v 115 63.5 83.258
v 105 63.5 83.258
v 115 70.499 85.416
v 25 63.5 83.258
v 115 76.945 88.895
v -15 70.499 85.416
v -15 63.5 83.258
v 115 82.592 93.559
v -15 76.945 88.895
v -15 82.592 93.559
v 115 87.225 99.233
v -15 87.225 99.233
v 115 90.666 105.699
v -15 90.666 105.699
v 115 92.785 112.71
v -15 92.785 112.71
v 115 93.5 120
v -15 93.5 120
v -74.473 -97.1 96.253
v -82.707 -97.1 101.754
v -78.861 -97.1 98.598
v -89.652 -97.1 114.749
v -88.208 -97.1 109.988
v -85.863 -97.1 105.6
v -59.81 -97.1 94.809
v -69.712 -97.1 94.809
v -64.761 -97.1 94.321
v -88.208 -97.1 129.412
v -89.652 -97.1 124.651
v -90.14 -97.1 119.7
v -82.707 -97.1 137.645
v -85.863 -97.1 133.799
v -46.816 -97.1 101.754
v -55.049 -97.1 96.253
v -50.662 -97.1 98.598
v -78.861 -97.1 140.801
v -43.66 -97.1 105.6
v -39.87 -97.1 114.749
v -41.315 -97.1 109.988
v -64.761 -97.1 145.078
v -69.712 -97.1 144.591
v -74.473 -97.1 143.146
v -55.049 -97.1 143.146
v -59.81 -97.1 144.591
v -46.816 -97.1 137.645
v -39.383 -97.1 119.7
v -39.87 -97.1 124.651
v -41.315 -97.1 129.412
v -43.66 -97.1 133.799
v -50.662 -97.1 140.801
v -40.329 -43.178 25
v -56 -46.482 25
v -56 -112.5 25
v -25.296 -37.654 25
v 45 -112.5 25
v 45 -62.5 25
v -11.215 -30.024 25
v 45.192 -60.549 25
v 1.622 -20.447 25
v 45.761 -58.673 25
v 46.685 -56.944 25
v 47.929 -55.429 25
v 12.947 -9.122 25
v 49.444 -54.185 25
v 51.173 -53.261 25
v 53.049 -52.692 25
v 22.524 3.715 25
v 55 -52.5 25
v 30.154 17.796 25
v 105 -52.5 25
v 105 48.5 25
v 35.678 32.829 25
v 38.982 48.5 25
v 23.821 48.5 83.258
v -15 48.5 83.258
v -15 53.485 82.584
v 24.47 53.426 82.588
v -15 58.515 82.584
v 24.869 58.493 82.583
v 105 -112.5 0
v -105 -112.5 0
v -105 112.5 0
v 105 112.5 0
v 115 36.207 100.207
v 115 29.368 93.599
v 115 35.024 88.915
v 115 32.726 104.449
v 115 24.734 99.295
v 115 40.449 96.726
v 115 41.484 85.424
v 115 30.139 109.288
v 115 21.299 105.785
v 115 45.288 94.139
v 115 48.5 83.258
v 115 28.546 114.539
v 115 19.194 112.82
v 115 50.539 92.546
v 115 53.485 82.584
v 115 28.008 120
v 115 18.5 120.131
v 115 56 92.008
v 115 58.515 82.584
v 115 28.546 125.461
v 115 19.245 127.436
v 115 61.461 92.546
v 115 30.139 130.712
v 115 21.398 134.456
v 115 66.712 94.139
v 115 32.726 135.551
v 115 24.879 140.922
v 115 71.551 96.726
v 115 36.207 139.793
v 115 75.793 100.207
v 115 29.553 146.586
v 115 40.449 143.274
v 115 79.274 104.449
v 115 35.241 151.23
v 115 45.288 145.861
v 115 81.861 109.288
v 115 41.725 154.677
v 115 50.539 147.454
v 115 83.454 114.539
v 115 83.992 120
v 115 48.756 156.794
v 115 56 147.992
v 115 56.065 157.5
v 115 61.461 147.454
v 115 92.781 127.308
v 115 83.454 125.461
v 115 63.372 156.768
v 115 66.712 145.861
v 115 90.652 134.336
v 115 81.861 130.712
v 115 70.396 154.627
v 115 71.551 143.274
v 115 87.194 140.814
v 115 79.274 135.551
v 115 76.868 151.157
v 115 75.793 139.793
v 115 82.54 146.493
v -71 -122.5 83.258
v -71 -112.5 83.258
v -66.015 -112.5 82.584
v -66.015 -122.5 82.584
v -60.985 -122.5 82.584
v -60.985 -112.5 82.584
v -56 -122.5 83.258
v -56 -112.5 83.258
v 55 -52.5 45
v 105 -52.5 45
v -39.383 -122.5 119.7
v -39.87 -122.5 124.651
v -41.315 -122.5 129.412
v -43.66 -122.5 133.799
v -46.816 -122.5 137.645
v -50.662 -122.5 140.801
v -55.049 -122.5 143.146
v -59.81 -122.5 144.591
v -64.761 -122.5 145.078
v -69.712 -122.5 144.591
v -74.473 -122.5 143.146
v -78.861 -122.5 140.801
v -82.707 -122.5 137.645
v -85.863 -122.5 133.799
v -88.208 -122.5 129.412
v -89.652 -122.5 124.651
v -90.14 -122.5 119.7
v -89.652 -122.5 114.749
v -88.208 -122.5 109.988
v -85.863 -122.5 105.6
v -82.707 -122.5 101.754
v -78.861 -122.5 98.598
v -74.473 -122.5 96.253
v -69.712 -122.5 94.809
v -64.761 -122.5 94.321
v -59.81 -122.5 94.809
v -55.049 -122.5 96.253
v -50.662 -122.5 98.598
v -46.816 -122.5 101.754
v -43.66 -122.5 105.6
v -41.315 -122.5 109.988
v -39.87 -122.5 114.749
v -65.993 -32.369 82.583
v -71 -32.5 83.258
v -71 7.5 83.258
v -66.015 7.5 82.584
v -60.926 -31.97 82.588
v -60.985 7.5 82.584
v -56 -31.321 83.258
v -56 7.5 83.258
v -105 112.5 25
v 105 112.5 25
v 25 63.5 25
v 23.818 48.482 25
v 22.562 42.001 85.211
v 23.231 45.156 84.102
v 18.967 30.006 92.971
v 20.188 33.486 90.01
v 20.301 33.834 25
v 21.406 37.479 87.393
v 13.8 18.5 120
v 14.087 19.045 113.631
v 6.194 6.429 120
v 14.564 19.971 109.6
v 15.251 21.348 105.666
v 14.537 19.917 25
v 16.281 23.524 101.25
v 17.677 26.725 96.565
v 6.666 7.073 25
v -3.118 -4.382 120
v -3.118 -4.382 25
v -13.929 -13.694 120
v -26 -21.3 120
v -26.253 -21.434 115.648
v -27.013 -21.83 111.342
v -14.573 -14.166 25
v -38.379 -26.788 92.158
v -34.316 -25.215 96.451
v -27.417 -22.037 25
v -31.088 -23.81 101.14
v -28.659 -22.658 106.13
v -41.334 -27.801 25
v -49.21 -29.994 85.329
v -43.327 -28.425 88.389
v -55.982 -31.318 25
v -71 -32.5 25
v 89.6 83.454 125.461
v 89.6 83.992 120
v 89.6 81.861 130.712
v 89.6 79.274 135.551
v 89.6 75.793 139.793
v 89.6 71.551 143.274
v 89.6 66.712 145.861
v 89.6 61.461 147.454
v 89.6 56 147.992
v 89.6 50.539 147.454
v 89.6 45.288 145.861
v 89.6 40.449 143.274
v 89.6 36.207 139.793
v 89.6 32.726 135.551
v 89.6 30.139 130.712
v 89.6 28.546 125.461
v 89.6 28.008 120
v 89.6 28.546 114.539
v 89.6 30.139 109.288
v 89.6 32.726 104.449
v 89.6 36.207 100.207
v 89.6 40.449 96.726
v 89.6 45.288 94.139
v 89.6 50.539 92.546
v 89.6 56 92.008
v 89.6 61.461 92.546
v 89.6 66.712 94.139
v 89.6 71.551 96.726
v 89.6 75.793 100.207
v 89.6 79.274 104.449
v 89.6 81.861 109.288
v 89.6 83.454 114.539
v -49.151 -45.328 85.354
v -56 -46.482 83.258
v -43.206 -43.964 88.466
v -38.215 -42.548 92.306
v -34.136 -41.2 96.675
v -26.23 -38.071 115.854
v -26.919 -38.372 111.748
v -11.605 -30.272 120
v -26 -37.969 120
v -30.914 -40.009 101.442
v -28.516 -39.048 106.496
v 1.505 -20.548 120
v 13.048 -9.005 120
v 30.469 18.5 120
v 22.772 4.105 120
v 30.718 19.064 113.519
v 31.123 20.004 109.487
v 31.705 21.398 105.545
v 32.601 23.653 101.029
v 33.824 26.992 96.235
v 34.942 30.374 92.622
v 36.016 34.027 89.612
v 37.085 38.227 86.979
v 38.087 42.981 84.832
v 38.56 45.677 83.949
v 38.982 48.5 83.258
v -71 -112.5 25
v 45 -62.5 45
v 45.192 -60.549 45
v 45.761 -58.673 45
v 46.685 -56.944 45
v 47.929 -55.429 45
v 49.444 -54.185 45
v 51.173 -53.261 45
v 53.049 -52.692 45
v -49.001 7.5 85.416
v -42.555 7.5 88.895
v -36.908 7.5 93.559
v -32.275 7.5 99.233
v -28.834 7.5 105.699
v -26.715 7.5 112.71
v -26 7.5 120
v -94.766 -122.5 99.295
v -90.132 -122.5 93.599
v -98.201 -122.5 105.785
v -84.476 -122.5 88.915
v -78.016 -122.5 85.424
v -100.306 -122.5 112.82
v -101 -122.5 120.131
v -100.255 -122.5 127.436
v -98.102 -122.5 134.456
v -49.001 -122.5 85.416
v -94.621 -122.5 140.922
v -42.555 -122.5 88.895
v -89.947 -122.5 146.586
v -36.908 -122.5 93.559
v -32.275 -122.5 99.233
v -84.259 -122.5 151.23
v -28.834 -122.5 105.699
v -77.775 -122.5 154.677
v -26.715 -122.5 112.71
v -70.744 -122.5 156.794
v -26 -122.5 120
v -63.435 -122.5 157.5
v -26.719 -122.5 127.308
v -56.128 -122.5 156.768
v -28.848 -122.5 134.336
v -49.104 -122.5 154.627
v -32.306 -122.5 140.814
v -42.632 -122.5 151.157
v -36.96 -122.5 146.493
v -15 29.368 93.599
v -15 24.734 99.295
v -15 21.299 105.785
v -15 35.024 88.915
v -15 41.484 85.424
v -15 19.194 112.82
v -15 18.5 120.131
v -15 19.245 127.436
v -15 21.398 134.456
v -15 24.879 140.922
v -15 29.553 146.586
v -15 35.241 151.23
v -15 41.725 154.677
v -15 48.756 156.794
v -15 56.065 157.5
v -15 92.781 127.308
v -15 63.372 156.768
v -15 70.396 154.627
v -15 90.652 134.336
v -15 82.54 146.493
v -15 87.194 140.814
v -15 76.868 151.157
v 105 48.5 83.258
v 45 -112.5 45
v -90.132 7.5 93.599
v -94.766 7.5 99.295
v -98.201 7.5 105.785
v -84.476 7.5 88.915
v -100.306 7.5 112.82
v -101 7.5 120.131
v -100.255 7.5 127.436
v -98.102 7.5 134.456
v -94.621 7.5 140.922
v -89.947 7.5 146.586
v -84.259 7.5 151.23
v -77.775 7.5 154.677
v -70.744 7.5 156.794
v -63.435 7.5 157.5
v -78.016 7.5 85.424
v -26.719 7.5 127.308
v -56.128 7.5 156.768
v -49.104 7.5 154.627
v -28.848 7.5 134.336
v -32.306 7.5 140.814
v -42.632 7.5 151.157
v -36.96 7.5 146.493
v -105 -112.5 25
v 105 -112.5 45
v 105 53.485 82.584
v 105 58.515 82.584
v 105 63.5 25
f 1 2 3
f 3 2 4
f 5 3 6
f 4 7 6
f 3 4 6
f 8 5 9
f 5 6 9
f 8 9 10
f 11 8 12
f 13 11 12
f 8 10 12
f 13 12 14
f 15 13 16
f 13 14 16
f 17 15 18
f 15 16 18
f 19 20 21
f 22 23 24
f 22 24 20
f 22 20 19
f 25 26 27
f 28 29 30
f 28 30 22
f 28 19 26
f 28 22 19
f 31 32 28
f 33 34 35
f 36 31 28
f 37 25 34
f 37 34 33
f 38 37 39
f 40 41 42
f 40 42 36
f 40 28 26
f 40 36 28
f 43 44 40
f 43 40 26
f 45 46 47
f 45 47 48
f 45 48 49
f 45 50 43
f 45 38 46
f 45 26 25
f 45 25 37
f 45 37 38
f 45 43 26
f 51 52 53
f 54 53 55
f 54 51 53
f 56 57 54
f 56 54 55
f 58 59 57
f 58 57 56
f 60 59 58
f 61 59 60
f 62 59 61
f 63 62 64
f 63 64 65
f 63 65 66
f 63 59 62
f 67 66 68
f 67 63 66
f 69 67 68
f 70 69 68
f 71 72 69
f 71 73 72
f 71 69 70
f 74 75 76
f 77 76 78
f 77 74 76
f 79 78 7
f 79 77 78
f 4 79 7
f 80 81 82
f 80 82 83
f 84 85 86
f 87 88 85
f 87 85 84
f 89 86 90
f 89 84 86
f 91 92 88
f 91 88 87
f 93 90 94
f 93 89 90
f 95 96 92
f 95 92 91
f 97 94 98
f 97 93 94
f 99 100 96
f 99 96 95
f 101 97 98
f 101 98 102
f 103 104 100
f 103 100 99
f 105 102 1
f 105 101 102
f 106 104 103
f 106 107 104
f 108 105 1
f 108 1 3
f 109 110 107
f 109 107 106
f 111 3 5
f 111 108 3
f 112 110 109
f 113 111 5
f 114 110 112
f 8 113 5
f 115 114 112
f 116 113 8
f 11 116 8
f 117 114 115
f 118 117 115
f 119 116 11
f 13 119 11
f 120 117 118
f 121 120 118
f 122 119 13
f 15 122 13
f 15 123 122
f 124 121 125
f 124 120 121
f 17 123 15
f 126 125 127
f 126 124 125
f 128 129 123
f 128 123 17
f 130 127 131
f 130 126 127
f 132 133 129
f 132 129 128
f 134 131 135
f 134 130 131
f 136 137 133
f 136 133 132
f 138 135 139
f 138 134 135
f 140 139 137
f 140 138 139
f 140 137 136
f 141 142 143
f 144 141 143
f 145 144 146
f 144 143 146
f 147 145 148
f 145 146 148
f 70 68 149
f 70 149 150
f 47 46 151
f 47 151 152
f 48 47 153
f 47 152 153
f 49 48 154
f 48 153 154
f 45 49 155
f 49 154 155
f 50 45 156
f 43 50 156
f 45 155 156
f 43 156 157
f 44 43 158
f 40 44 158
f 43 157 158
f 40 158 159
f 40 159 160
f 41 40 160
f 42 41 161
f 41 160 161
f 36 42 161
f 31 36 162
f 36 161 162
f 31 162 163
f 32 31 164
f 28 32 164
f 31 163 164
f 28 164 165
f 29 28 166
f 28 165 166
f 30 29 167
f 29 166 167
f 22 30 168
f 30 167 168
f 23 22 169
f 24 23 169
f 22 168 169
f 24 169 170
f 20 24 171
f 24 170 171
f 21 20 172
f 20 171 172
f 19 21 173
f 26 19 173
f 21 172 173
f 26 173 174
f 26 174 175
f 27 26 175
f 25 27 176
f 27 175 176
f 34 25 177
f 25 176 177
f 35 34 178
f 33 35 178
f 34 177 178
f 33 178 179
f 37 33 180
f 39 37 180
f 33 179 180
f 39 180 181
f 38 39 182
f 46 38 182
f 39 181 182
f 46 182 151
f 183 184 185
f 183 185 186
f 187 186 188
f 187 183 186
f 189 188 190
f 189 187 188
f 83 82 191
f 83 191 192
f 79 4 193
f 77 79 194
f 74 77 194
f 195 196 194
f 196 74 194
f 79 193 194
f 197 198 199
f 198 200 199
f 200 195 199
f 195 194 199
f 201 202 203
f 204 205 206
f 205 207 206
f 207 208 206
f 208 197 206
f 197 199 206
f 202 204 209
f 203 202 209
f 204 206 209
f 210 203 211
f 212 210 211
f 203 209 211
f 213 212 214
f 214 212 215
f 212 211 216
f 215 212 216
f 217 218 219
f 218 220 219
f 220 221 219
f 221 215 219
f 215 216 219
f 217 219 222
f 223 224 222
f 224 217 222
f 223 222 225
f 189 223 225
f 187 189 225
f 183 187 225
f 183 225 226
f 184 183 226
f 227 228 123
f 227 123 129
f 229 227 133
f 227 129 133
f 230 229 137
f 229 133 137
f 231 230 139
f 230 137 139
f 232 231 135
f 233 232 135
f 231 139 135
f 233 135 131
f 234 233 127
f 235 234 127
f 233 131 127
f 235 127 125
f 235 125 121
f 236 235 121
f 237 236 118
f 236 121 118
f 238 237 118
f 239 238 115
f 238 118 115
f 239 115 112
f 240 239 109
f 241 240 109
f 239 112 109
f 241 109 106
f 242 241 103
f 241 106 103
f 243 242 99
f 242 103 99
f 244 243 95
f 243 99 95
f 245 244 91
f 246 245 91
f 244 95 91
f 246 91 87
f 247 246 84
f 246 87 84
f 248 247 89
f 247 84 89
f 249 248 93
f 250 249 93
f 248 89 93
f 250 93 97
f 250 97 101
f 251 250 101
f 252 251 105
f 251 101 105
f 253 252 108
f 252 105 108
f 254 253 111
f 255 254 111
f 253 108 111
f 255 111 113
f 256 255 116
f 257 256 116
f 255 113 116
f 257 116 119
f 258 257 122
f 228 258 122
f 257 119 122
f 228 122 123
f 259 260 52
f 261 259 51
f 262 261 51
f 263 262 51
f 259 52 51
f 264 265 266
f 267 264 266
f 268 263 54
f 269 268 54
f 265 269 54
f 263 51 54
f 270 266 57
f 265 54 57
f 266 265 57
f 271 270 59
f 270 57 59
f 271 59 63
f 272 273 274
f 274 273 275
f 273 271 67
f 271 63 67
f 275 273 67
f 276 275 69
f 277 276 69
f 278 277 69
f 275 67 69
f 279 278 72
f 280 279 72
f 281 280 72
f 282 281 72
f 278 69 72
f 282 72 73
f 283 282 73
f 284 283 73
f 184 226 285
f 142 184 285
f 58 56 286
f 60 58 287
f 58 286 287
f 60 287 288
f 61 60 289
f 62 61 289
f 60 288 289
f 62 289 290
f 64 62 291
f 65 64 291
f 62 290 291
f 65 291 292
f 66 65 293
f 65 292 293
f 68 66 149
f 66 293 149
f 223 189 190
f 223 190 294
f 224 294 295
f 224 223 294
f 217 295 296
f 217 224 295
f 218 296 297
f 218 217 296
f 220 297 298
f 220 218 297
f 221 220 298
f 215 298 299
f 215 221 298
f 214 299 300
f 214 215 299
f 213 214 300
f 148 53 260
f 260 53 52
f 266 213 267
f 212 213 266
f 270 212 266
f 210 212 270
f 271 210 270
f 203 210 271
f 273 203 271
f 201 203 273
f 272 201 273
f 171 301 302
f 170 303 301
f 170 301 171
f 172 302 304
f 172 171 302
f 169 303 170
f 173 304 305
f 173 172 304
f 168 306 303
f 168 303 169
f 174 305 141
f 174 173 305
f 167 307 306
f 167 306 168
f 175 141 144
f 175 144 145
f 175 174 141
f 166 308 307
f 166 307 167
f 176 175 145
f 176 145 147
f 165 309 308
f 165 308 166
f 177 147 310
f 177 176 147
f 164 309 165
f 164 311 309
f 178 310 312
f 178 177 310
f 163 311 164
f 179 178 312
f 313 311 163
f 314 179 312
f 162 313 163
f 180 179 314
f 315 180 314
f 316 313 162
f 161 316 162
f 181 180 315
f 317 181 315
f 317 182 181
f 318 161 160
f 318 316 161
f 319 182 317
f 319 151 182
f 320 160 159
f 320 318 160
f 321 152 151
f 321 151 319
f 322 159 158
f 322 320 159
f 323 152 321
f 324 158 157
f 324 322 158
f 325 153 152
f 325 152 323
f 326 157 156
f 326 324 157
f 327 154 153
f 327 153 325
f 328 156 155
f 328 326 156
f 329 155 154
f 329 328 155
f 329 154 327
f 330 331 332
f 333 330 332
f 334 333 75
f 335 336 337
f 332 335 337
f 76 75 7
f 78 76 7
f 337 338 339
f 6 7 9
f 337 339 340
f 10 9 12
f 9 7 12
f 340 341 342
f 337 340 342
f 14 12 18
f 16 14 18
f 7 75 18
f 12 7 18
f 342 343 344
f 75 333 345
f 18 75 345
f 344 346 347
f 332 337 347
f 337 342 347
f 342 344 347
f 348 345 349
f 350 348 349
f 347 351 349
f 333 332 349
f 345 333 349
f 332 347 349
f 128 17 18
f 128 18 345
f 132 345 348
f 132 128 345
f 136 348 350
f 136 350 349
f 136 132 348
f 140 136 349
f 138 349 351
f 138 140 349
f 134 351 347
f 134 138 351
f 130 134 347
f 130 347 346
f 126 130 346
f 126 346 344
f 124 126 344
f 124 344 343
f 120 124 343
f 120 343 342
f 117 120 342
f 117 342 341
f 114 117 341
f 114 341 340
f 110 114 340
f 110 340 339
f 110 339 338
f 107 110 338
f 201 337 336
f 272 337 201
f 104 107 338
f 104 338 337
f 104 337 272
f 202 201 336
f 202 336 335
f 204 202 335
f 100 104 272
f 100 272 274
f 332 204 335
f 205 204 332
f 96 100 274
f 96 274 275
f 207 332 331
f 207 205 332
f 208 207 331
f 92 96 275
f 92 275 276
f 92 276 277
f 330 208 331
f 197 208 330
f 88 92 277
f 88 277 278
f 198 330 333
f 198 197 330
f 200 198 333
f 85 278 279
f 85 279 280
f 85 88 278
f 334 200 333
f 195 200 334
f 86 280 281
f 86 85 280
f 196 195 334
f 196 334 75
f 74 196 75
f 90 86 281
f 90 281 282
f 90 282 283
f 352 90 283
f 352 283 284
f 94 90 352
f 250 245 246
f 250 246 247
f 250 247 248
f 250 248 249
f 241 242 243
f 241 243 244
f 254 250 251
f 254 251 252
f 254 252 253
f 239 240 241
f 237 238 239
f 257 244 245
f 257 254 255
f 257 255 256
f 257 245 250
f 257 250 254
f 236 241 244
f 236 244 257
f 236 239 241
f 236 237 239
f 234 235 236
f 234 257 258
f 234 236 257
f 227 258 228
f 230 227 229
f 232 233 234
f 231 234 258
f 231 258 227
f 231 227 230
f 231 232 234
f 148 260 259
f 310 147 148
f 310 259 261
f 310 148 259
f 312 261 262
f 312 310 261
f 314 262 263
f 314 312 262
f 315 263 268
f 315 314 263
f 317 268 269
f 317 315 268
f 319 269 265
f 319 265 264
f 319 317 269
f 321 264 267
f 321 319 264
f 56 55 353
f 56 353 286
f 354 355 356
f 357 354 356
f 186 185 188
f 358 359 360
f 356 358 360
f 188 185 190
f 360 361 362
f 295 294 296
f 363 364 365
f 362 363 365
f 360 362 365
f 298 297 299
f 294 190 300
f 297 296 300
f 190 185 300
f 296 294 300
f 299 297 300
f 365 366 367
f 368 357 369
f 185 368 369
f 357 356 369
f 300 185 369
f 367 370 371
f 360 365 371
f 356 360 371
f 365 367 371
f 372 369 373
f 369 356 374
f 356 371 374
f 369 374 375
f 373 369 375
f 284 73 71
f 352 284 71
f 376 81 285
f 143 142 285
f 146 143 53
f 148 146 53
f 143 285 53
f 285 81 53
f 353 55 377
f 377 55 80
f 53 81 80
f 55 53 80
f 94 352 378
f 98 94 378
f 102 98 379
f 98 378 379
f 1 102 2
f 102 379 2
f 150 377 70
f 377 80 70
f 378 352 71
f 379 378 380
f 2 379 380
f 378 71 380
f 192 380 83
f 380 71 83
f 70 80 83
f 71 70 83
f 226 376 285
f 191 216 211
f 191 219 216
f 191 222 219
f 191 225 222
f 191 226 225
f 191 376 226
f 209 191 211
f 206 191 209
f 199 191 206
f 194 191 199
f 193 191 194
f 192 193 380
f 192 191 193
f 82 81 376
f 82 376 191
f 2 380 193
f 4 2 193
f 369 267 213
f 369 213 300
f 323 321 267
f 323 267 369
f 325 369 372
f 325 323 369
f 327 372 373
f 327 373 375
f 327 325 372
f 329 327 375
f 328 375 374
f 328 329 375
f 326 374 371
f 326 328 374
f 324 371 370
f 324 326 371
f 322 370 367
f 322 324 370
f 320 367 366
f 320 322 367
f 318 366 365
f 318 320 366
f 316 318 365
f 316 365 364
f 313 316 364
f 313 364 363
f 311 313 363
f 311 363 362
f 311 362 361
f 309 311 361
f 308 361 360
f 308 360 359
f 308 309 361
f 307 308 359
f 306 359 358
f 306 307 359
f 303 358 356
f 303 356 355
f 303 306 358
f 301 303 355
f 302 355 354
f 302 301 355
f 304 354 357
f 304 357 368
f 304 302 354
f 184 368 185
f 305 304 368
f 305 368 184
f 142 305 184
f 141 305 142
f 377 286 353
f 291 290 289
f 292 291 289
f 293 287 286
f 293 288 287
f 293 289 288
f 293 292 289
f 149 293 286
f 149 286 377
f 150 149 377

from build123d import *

# Parameters (mm, degrees)
F0_W          = 210
F0_H          = 225
F1_DEPTH      = 25
F3_DEPTH      = 95
F5_DEPTH      = 10
F5_DEPTH_BACK = 120
F7_DEPTH      = 10
F7_DEPTH_BACK = 120
F8_W          = 60
F8_H          = 60
F9_DEPTH      = 20
F10_R         = 10
F12_R         = 25.3785837957
F13_DEPTH     = 25.4
F14_R         = 27.9917909544
F15_DEPTH     = 25.4


with BuildPart() as f1:
    # F0 (on Top) → F1 (new body)
    with BuildSketch(Plane.XY):
        Rectangle(F0_W, F0_H)
    extrude(amount=F1_DEPTH)

    # F2 (on face) → F3 (join)
    with BuildSketch(Plane.XY.offset(25)):
        with BuildLine():
            Line((-71, -32.5), (-71, -112.5))
            Line((-71, -112.5), (-56, -112.5))
            Line((-56, -112.5), (-56, -46.4818166789))
            ThreePointArc((-56, -46.4818166789), (7.4888527117, -14.9888527117), (38.9818166789, 48.5))
            Line((38.9818166789, 48.5), (105, 48.5))
            Line((105, 48.5), (105, 63.5))
            Line((105, 63.5), (25, 63.5))
            ThreePointArc((25, 63.5), (-3.1177490061, -4.3822509939), (-71, -32.5))
        make_face()
    extrude(amount=F3_DEPTH)

    # F4 (on face) → F5 (join, two sides)
    with BuildSketch(Plane.XZ.offset(112.5)) as f5_sk:
        with BuildLine():
            ThreePointArc((-56, 83.2576538583), (-34.4526249034, 96.2829175487), (-26, 120))
            ThreePointArc((-26, 120), (-87.2170824513, 149.0473750966), (-71, 83.2576538583))
            Line((-71, 83.2576538583), (-71, 120))
            Line((-71, 120), (-56, 120))
            Line((-56, 120), (-56, 83.2576538583))
        make_face()
        with BuildLine():
            Line((-71, 120), (-71, 83.2576538583))
            ThreePointArc((-71, 83.2576538583), (-63.5, 82.5), (-56, 83.2576538583))
            Line((-56, 83.2576538583), (-56, 120))
            Line((-56, 120), (-71, 120))
        make_face()
    extrude(amount=F5_DEPTH)
    extrude(f5_sk.sketch, amount=-F5_DEPTH_BACK)

    # F6 (on face) → F7 (join, two sides)
    with BuildSketch(Plane.YZ.offset(105)) as f7_sk:
        with BuildLine():
            Line((48.5, 120), (48.5, 83.2576538583))
            ThreePointArc((48.5, 83.2576538583), (56, 82.5), (63.5, 83.2576538583))
            Line((63.5, 83.2576538583), (63.5, 120))
            Line((63.5, 120), (48.5, 120))
        make_face()
        with BuildLine():
            ThreePointArc((63.5, 83.2576538583), (85.0473750966, 96.2829175487), (93.5, 120))
            ThreePointArc((93.5, 120), (32.2829175487, 149.0473750966), (48.5, 83.2576538583))
            Line((48.5, 83.2576538583), (48.5, 120))
            Line((48.5, 120), (63.5, 120))
            Line((63.5, 120), (63.5, 83.2576538583))
        make_face()
    extrude(amount=F7_DEPTH)
    extrude(f7_sk.sketch, amount=-F7_DEPTH_BACK)

    # F8 (on face) → F9 (join)
    with BuildSketch(Plane.XY.offset(25)):
        with Locations((75, -82.5)):
            Rectangle(F8_W, F8_H)
    extrude(amount=F9_DEPTH)

    # F10
    f10_edges = [f1.edges().sort_by_distance(p)[0] for p in [
        (45, -52.5, 35),
    ]]
    fillet(f10_edges, radius=F10_R)

    # F12 (on face) → F13 (cut)
    with BuildSketch(Plane.XZ.offset(122.5)):
        with Locations((-64.7613108158, 119.6997389197)):
            Circle(F12_R)
    extrude(amount=-F13_DEPTH, mode=Mode.SUBTRACT)

    # F14 (on face) → F15 (cut)
    with BuildSketch(Plane.YZ.offset(115)):
        with Locations((56, 120)):
            Circle(F14_R)
    extrude(amount=-F15_DEPTH, mode=Mode.SUBTRACT)


solid = f1.part
